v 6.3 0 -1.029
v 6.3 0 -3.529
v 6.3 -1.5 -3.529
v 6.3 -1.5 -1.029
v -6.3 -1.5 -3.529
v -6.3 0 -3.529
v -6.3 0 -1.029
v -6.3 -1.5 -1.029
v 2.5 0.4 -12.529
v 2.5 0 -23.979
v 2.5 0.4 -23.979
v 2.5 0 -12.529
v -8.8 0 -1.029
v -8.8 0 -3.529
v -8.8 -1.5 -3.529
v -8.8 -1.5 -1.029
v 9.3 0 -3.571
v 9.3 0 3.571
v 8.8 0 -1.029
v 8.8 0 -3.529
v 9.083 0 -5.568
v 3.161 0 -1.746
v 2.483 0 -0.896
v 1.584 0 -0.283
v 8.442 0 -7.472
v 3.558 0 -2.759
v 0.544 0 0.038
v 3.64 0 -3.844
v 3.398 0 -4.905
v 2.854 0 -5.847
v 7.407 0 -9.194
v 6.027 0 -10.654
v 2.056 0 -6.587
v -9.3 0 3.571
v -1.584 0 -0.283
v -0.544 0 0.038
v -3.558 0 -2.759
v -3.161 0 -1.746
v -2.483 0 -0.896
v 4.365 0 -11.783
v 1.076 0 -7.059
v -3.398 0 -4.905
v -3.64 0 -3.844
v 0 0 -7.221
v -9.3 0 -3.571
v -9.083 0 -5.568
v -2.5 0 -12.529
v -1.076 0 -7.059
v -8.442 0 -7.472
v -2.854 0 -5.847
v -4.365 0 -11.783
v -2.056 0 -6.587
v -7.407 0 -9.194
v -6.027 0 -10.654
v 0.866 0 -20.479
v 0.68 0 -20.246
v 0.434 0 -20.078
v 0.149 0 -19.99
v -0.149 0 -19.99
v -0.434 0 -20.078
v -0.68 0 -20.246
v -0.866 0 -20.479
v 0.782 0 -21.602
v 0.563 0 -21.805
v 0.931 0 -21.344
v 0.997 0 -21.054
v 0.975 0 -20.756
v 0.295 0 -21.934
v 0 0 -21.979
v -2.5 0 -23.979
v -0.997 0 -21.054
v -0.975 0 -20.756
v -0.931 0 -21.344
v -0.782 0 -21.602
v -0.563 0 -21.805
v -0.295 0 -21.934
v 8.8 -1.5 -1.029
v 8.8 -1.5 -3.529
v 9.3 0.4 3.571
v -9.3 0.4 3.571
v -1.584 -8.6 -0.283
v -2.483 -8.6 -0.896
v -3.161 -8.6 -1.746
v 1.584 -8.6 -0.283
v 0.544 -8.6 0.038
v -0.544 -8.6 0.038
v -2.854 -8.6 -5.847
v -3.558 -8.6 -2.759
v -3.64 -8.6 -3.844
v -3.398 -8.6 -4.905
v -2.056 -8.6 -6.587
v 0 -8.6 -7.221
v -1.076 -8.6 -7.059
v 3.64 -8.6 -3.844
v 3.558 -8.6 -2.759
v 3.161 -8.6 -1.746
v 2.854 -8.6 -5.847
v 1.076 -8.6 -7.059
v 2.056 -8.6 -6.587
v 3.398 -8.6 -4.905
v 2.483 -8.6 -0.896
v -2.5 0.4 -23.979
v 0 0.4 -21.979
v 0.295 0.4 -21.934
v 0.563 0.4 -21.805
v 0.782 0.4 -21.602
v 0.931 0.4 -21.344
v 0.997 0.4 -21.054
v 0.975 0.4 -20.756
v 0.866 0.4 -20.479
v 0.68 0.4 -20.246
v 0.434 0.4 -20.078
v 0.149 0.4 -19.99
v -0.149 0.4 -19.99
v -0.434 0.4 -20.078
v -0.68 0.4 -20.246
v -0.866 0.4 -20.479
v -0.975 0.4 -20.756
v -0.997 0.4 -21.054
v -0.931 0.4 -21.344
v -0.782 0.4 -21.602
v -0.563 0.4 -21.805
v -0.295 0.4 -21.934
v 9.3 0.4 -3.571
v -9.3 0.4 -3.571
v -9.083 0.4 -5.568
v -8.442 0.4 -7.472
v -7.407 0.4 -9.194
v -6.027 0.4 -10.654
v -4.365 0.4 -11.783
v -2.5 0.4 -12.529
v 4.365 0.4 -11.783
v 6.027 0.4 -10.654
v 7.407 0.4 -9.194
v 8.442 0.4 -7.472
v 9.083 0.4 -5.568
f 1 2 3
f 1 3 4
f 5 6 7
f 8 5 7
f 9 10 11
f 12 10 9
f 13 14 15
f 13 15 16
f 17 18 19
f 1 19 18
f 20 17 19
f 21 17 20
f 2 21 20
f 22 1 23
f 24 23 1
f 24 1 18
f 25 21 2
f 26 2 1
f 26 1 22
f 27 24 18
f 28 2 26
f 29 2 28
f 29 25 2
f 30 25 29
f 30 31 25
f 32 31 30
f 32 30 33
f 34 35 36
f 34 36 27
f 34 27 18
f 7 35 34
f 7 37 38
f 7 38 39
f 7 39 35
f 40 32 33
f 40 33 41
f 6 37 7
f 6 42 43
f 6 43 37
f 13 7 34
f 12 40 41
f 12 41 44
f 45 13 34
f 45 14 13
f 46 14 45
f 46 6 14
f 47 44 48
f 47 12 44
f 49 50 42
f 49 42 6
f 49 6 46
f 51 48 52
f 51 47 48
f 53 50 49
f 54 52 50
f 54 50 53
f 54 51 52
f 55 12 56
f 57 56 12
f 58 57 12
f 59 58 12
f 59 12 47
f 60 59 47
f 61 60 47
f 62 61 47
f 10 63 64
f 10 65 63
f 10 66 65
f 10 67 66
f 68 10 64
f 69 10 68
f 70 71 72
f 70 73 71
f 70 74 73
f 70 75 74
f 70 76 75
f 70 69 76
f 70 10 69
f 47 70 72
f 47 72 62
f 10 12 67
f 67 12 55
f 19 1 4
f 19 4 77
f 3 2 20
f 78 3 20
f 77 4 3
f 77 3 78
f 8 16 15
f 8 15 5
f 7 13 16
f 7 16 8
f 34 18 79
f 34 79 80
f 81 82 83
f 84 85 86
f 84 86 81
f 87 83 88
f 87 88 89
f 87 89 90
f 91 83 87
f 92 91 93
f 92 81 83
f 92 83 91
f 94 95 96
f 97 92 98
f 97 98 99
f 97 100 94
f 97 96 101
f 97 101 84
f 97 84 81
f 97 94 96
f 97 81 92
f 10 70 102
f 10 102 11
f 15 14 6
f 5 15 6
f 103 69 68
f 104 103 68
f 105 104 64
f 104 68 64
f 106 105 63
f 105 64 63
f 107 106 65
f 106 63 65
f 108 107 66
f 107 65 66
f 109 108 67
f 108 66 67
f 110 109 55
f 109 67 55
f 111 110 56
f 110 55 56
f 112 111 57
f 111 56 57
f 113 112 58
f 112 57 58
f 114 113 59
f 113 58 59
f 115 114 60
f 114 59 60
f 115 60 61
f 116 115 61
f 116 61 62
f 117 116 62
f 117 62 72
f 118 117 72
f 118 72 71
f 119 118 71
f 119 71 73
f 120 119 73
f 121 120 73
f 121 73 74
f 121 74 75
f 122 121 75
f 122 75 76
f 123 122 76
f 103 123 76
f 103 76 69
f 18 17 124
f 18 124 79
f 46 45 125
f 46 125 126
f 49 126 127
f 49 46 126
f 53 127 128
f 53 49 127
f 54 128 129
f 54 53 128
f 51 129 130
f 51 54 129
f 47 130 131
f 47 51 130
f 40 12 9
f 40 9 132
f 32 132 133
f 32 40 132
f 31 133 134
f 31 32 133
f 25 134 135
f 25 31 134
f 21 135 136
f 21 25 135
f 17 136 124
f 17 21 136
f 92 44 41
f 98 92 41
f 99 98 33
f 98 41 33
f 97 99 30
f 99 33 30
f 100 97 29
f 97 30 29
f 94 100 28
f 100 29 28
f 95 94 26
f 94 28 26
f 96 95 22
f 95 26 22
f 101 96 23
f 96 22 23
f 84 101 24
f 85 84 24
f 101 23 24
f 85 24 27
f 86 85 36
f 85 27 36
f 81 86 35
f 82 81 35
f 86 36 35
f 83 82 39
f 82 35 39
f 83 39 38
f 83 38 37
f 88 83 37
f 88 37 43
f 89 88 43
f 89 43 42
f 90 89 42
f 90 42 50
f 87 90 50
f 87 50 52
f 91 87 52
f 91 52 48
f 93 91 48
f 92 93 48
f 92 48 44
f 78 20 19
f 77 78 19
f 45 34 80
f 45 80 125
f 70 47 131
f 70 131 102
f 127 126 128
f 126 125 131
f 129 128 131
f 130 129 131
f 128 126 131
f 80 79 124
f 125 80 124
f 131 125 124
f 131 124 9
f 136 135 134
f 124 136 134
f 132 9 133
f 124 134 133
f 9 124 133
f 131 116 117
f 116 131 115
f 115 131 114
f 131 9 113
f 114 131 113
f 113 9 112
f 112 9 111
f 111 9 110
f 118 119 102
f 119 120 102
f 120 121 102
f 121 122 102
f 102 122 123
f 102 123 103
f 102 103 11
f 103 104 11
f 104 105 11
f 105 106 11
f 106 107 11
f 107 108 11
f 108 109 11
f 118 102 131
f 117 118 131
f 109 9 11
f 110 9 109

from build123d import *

# Parameters (mm, degrees)
EXTRUDE_1_DEPTH     = 0.4
SKETCH_3_W          = 2.5
SKETCH_3_H          = 2.5
EXTRUDE_2_DEPTH     = 1.5
CUT_EXTRUDE_1_REACH = 27.763
SKETCH_5_R          = 1
EXTRUDE_START       = -0.4
SKETCH_6_R          = 3.65
EXTRUDE_3_DEPTH     = 9


with BuildPart() as part:
    # 草图1 → 凸台-拉伸1 (new body)
    with BuildSketch(Plane(origin=(0, 0, 0), x_dir=(1, 0, 0), z_dir=(0, 1, 0))):
        with BuildLine():
            Line((-2.5, 12.528839135), (-2.5, 23.978839135))
            Line((-2.5, 23.978839135), (2.5, 23.978839135))
            Line((2.5, 23.978839135), (2.5, 12.528839135))
            ThreePointArc((2.5, 12.528839135), (7.407428704, 9.194327232), (9.3, 3.571160865))
            Line((9.3, 3.571160865), (9.3, -3.571160865))
            Line((9.3, -3.571160865), (-9.3, -3.571160865))
            Line((-9.3, -3.571160865), (-9.3, 3.571160865))
            ThreePointArc((-9.3, 3.571160865), (-7.407428704, 9.194327232), (-2.5, 12.528839135))
        make_face()
    extrude(amount=EXTRUDE_1_DEPTH)

    # 草图3 → 凸台-拉伸2 (add)
    with BuildSketch(Plane.XZ):
        with Locations((7.55, -2.278839135)):
            Rectangle(SKETCH_3_W, SKETCH_3_H)
        with Locations((-7.55, -2.278839135)):
            Rectangle(SKETCH_3_W, SKETCH_3_H)
    extrude(amount=EXTRUDE_2_DEPTH)

    # 草图5 → 切除-拉伸1 (cut, up to next)
    with BuildSketch(Plane.XZ, mode=Mode.PRIVATE) as cut_extrude_1_sk1:
        with Locations(Location((0, -20.978839135, 0), (0, 0, 270))):
            Circle(SKETCH_5_R)
    cut_extrude_1_tool1 = extrude(cut_extrude_1_sk1.sketch, amount=-CUT_EXTRUDE_1_REACH, mode=Mode.PRIVATE) & part.part
    add(cut_extrude_1_tool1.solids().sort_by_distance((0, 0, -20.978839))[0], mode=Mode.SUBTRACT)

    # 草图6 → 凸台-拉伸3 (add)
    with BuildSketch(Plane.XZ.offset(EXTRUDE_START)):
        with Locations(Location((0, -3.571160865, 0), (0, 0, 270))):
            Circle(SKETCH_6_R)
    extrude(amount=EXTRUDE_3_DEPTH)


solid = part.part
